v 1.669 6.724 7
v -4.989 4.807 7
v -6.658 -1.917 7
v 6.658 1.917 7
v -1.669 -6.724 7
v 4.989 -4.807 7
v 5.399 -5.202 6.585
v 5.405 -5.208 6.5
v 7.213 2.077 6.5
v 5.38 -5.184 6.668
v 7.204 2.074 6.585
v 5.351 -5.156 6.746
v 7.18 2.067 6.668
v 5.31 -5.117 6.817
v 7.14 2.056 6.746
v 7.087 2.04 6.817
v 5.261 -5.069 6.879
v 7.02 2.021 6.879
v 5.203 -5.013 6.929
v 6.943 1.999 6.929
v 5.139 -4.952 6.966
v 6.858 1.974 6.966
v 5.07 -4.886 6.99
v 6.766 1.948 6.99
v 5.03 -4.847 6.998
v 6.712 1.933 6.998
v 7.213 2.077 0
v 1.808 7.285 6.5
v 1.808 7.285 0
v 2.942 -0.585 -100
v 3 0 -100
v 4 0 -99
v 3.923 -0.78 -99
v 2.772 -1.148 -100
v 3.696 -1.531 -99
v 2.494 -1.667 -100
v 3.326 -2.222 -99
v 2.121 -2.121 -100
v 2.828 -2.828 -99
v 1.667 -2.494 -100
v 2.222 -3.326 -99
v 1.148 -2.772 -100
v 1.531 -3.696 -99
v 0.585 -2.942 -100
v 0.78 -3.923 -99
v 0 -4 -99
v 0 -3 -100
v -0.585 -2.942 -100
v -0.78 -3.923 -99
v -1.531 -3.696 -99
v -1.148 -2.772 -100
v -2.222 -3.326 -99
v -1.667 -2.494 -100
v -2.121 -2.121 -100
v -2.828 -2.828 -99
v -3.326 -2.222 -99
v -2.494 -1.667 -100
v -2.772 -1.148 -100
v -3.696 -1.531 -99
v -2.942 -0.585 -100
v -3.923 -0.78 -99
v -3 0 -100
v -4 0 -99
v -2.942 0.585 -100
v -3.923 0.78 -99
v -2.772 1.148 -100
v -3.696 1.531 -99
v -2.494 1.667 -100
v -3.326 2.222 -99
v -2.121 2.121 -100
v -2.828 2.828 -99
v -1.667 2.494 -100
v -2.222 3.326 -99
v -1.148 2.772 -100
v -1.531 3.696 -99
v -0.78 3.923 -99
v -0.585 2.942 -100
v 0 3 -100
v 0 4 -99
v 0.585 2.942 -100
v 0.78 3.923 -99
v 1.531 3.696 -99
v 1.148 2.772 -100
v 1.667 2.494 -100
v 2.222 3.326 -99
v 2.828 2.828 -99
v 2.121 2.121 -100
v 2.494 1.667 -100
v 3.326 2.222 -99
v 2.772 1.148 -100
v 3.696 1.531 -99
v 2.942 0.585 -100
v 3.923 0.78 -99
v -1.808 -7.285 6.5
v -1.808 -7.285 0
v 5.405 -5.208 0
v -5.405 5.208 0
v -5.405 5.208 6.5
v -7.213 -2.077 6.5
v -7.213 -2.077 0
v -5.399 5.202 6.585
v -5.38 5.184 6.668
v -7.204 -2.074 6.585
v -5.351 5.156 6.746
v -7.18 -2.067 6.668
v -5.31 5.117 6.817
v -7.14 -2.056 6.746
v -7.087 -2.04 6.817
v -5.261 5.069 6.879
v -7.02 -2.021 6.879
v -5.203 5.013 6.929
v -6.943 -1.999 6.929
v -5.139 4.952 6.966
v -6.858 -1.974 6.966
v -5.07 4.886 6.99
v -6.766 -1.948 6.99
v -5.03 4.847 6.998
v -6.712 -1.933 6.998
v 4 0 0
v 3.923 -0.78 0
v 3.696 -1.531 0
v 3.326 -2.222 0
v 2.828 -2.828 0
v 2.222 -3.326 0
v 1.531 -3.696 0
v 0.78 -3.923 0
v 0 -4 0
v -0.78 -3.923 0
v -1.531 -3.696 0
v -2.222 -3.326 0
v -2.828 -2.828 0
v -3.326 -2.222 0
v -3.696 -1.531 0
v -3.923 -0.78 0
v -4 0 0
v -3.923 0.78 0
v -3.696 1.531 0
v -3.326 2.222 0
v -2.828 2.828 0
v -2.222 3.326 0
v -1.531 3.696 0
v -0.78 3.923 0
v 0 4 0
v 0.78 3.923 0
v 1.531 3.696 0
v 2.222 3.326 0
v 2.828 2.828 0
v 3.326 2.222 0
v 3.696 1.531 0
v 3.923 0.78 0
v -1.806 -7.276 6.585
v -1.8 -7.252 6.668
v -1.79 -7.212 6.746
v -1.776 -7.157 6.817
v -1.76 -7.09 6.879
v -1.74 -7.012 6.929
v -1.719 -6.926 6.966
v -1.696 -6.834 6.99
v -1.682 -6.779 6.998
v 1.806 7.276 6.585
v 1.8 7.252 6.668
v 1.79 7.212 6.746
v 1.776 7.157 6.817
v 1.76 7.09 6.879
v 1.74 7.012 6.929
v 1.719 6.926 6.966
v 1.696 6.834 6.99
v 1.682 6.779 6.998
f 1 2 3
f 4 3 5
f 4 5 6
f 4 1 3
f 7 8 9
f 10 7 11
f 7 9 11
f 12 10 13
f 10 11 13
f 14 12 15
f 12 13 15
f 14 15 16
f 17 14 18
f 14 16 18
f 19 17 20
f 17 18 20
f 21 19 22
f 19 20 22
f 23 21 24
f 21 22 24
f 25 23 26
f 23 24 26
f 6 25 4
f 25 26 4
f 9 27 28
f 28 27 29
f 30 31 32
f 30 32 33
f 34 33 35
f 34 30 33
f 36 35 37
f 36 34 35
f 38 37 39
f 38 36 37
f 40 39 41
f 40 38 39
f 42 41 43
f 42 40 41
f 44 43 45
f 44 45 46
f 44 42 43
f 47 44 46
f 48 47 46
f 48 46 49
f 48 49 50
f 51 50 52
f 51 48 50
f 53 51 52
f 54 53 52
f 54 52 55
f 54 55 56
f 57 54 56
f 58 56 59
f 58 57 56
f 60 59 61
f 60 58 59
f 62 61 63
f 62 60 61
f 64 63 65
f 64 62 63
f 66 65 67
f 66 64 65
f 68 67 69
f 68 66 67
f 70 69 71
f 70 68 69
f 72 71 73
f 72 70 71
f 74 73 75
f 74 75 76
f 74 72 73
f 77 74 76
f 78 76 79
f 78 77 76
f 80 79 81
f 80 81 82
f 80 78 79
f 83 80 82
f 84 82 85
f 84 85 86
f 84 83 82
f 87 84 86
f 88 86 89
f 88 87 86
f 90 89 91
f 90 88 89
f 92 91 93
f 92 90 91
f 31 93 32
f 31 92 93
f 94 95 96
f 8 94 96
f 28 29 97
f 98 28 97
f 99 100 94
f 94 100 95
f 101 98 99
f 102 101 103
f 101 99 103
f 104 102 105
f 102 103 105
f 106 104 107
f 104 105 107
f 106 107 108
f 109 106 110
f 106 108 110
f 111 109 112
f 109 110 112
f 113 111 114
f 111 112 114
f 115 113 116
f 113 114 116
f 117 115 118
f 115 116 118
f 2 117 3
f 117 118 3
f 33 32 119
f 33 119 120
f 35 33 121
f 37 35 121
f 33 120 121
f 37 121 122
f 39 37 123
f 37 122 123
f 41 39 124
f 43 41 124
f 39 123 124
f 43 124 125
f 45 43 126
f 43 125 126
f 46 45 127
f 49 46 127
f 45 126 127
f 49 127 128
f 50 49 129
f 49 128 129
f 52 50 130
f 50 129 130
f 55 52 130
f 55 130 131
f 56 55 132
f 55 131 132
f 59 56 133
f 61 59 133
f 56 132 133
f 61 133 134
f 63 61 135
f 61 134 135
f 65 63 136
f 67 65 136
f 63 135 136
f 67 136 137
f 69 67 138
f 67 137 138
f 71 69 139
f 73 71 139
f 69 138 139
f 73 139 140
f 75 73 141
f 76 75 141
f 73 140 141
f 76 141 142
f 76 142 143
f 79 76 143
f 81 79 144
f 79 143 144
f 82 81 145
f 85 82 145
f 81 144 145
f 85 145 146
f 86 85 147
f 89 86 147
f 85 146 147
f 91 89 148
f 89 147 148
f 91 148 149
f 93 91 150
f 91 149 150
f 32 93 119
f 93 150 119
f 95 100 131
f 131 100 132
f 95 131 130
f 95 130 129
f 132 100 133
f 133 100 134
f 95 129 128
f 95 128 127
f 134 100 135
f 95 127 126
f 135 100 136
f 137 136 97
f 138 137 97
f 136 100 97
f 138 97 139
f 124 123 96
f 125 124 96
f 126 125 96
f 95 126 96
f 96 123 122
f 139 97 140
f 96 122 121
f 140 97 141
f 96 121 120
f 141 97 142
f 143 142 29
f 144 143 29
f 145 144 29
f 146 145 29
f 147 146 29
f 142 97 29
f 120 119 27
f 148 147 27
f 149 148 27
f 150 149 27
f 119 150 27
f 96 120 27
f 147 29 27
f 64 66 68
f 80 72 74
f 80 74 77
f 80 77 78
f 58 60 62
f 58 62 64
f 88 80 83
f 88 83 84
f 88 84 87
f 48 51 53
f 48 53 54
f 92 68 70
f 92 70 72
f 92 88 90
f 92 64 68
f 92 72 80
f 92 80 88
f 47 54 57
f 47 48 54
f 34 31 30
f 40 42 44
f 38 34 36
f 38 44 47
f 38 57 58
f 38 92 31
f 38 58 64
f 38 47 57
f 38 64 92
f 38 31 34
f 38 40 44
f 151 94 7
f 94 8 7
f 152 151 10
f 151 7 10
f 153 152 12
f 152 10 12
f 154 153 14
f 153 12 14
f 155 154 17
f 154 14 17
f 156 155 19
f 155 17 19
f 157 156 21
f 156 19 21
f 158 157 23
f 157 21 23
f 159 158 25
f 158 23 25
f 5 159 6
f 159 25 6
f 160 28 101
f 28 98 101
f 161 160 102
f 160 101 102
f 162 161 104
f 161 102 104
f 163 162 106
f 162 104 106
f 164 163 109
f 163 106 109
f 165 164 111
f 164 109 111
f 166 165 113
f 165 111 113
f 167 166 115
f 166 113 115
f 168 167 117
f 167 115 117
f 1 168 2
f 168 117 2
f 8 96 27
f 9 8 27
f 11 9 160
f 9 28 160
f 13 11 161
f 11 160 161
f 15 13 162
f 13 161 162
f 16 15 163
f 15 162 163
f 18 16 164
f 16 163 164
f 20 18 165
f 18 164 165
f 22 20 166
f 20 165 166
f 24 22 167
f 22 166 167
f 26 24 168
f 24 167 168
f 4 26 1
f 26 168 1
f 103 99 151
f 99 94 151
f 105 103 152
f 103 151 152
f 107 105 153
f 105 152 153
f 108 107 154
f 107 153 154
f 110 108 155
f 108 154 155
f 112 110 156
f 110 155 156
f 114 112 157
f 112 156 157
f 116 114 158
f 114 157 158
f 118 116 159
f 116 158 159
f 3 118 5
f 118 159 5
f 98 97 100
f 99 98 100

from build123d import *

# Parameters (mm, degrees)
F1_DEPTH = 7
F2_R     = 0.5
F3_R     = 4
F4_DEPTH = 100
F5_SIZE  = 1


with BuildPart() as f1:
    # F0 (on Top) → F1 (new body)
    with BuildSketch(Plane.XY):
        Polygon((1.807803, 7.284585), (-5.404734, 5.207896), (-7.212537, -2.076689), (-1.807803, -7.284585), (5.404734, -5.207896), (7.212537, 2.076689), align=None)
    extrude(amount=F1_DEPTH)

    # F2
    f2_edges = [f1.edges().sort_by_distance(p)[0] for p in [
        (-4.51017, -4.680637, 7),
        (1.798465, -6.246241, 7),
        (4.51017, 4.680637, 7),
        (-1.798465, 6.246241, 7),
        (-6.308636, 1.565604, 7),
        (6.308636, -1.565604, 7),
    ]]
    fillet(f2_edges, radius=F2_R)

    # F3 (on face) → F4 (join)
    with BuildSketch(Plane(origin=(0, 0, 0), x_dir=(1, 0, 0), z_dir=(0, 0, -1))):
        Circle(F3_R)
    extrude(amount=F4_DEPTH)

    # F5
    f5_edges = [f1.edges().sort_by_distance(p)[0] for p in [
        (-4, 0, -100),
    ]]
    chamfer(f5_edges, length=F5_SIZE)


solid = f1.part
